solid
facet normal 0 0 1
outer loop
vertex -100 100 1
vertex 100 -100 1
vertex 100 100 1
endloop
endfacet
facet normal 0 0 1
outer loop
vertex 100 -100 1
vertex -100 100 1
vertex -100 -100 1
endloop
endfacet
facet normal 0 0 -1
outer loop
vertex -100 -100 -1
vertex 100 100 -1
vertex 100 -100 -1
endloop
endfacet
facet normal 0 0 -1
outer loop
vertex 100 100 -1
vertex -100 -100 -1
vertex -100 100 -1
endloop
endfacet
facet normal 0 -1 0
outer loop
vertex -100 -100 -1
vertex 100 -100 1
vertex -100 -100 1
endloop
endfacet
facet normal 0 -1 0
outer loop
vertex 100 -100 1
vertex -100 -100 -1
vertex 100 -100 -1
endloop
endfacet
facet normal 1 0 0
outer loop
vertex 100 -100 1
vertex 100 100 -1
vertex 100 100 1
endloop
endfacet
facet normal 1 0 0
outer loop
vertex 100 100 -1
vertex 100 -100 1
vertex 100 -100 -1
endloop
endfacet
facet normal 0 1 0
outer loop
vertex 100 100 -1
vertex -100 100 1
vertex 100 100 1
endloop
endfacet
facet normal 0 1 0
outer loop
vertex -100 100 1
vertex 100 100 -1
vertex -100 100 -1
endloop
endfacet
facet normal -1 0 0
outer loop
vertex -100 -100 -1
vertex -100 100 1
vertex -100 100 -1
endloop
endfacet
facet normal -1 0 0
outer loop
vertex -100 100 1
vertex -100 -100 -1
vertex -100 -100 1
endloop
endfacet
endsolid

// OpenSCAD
// Parameters
sheet_length = 200; //[100:400:1]
sheet_width = 200; //[100:400:1]
sheet_thickness = 2; //[1:4:0.5]

// Geometry
module sheet_body() {
  color([0.85, 0.85, 0.8]) // Off-white for 3D printed PLA
  translate([0, 0, 0])
    cube([sheet_length, sheet_width, sheet_thickness], center=true);
}

// Final Output
union() {
  sheet_body();
}
